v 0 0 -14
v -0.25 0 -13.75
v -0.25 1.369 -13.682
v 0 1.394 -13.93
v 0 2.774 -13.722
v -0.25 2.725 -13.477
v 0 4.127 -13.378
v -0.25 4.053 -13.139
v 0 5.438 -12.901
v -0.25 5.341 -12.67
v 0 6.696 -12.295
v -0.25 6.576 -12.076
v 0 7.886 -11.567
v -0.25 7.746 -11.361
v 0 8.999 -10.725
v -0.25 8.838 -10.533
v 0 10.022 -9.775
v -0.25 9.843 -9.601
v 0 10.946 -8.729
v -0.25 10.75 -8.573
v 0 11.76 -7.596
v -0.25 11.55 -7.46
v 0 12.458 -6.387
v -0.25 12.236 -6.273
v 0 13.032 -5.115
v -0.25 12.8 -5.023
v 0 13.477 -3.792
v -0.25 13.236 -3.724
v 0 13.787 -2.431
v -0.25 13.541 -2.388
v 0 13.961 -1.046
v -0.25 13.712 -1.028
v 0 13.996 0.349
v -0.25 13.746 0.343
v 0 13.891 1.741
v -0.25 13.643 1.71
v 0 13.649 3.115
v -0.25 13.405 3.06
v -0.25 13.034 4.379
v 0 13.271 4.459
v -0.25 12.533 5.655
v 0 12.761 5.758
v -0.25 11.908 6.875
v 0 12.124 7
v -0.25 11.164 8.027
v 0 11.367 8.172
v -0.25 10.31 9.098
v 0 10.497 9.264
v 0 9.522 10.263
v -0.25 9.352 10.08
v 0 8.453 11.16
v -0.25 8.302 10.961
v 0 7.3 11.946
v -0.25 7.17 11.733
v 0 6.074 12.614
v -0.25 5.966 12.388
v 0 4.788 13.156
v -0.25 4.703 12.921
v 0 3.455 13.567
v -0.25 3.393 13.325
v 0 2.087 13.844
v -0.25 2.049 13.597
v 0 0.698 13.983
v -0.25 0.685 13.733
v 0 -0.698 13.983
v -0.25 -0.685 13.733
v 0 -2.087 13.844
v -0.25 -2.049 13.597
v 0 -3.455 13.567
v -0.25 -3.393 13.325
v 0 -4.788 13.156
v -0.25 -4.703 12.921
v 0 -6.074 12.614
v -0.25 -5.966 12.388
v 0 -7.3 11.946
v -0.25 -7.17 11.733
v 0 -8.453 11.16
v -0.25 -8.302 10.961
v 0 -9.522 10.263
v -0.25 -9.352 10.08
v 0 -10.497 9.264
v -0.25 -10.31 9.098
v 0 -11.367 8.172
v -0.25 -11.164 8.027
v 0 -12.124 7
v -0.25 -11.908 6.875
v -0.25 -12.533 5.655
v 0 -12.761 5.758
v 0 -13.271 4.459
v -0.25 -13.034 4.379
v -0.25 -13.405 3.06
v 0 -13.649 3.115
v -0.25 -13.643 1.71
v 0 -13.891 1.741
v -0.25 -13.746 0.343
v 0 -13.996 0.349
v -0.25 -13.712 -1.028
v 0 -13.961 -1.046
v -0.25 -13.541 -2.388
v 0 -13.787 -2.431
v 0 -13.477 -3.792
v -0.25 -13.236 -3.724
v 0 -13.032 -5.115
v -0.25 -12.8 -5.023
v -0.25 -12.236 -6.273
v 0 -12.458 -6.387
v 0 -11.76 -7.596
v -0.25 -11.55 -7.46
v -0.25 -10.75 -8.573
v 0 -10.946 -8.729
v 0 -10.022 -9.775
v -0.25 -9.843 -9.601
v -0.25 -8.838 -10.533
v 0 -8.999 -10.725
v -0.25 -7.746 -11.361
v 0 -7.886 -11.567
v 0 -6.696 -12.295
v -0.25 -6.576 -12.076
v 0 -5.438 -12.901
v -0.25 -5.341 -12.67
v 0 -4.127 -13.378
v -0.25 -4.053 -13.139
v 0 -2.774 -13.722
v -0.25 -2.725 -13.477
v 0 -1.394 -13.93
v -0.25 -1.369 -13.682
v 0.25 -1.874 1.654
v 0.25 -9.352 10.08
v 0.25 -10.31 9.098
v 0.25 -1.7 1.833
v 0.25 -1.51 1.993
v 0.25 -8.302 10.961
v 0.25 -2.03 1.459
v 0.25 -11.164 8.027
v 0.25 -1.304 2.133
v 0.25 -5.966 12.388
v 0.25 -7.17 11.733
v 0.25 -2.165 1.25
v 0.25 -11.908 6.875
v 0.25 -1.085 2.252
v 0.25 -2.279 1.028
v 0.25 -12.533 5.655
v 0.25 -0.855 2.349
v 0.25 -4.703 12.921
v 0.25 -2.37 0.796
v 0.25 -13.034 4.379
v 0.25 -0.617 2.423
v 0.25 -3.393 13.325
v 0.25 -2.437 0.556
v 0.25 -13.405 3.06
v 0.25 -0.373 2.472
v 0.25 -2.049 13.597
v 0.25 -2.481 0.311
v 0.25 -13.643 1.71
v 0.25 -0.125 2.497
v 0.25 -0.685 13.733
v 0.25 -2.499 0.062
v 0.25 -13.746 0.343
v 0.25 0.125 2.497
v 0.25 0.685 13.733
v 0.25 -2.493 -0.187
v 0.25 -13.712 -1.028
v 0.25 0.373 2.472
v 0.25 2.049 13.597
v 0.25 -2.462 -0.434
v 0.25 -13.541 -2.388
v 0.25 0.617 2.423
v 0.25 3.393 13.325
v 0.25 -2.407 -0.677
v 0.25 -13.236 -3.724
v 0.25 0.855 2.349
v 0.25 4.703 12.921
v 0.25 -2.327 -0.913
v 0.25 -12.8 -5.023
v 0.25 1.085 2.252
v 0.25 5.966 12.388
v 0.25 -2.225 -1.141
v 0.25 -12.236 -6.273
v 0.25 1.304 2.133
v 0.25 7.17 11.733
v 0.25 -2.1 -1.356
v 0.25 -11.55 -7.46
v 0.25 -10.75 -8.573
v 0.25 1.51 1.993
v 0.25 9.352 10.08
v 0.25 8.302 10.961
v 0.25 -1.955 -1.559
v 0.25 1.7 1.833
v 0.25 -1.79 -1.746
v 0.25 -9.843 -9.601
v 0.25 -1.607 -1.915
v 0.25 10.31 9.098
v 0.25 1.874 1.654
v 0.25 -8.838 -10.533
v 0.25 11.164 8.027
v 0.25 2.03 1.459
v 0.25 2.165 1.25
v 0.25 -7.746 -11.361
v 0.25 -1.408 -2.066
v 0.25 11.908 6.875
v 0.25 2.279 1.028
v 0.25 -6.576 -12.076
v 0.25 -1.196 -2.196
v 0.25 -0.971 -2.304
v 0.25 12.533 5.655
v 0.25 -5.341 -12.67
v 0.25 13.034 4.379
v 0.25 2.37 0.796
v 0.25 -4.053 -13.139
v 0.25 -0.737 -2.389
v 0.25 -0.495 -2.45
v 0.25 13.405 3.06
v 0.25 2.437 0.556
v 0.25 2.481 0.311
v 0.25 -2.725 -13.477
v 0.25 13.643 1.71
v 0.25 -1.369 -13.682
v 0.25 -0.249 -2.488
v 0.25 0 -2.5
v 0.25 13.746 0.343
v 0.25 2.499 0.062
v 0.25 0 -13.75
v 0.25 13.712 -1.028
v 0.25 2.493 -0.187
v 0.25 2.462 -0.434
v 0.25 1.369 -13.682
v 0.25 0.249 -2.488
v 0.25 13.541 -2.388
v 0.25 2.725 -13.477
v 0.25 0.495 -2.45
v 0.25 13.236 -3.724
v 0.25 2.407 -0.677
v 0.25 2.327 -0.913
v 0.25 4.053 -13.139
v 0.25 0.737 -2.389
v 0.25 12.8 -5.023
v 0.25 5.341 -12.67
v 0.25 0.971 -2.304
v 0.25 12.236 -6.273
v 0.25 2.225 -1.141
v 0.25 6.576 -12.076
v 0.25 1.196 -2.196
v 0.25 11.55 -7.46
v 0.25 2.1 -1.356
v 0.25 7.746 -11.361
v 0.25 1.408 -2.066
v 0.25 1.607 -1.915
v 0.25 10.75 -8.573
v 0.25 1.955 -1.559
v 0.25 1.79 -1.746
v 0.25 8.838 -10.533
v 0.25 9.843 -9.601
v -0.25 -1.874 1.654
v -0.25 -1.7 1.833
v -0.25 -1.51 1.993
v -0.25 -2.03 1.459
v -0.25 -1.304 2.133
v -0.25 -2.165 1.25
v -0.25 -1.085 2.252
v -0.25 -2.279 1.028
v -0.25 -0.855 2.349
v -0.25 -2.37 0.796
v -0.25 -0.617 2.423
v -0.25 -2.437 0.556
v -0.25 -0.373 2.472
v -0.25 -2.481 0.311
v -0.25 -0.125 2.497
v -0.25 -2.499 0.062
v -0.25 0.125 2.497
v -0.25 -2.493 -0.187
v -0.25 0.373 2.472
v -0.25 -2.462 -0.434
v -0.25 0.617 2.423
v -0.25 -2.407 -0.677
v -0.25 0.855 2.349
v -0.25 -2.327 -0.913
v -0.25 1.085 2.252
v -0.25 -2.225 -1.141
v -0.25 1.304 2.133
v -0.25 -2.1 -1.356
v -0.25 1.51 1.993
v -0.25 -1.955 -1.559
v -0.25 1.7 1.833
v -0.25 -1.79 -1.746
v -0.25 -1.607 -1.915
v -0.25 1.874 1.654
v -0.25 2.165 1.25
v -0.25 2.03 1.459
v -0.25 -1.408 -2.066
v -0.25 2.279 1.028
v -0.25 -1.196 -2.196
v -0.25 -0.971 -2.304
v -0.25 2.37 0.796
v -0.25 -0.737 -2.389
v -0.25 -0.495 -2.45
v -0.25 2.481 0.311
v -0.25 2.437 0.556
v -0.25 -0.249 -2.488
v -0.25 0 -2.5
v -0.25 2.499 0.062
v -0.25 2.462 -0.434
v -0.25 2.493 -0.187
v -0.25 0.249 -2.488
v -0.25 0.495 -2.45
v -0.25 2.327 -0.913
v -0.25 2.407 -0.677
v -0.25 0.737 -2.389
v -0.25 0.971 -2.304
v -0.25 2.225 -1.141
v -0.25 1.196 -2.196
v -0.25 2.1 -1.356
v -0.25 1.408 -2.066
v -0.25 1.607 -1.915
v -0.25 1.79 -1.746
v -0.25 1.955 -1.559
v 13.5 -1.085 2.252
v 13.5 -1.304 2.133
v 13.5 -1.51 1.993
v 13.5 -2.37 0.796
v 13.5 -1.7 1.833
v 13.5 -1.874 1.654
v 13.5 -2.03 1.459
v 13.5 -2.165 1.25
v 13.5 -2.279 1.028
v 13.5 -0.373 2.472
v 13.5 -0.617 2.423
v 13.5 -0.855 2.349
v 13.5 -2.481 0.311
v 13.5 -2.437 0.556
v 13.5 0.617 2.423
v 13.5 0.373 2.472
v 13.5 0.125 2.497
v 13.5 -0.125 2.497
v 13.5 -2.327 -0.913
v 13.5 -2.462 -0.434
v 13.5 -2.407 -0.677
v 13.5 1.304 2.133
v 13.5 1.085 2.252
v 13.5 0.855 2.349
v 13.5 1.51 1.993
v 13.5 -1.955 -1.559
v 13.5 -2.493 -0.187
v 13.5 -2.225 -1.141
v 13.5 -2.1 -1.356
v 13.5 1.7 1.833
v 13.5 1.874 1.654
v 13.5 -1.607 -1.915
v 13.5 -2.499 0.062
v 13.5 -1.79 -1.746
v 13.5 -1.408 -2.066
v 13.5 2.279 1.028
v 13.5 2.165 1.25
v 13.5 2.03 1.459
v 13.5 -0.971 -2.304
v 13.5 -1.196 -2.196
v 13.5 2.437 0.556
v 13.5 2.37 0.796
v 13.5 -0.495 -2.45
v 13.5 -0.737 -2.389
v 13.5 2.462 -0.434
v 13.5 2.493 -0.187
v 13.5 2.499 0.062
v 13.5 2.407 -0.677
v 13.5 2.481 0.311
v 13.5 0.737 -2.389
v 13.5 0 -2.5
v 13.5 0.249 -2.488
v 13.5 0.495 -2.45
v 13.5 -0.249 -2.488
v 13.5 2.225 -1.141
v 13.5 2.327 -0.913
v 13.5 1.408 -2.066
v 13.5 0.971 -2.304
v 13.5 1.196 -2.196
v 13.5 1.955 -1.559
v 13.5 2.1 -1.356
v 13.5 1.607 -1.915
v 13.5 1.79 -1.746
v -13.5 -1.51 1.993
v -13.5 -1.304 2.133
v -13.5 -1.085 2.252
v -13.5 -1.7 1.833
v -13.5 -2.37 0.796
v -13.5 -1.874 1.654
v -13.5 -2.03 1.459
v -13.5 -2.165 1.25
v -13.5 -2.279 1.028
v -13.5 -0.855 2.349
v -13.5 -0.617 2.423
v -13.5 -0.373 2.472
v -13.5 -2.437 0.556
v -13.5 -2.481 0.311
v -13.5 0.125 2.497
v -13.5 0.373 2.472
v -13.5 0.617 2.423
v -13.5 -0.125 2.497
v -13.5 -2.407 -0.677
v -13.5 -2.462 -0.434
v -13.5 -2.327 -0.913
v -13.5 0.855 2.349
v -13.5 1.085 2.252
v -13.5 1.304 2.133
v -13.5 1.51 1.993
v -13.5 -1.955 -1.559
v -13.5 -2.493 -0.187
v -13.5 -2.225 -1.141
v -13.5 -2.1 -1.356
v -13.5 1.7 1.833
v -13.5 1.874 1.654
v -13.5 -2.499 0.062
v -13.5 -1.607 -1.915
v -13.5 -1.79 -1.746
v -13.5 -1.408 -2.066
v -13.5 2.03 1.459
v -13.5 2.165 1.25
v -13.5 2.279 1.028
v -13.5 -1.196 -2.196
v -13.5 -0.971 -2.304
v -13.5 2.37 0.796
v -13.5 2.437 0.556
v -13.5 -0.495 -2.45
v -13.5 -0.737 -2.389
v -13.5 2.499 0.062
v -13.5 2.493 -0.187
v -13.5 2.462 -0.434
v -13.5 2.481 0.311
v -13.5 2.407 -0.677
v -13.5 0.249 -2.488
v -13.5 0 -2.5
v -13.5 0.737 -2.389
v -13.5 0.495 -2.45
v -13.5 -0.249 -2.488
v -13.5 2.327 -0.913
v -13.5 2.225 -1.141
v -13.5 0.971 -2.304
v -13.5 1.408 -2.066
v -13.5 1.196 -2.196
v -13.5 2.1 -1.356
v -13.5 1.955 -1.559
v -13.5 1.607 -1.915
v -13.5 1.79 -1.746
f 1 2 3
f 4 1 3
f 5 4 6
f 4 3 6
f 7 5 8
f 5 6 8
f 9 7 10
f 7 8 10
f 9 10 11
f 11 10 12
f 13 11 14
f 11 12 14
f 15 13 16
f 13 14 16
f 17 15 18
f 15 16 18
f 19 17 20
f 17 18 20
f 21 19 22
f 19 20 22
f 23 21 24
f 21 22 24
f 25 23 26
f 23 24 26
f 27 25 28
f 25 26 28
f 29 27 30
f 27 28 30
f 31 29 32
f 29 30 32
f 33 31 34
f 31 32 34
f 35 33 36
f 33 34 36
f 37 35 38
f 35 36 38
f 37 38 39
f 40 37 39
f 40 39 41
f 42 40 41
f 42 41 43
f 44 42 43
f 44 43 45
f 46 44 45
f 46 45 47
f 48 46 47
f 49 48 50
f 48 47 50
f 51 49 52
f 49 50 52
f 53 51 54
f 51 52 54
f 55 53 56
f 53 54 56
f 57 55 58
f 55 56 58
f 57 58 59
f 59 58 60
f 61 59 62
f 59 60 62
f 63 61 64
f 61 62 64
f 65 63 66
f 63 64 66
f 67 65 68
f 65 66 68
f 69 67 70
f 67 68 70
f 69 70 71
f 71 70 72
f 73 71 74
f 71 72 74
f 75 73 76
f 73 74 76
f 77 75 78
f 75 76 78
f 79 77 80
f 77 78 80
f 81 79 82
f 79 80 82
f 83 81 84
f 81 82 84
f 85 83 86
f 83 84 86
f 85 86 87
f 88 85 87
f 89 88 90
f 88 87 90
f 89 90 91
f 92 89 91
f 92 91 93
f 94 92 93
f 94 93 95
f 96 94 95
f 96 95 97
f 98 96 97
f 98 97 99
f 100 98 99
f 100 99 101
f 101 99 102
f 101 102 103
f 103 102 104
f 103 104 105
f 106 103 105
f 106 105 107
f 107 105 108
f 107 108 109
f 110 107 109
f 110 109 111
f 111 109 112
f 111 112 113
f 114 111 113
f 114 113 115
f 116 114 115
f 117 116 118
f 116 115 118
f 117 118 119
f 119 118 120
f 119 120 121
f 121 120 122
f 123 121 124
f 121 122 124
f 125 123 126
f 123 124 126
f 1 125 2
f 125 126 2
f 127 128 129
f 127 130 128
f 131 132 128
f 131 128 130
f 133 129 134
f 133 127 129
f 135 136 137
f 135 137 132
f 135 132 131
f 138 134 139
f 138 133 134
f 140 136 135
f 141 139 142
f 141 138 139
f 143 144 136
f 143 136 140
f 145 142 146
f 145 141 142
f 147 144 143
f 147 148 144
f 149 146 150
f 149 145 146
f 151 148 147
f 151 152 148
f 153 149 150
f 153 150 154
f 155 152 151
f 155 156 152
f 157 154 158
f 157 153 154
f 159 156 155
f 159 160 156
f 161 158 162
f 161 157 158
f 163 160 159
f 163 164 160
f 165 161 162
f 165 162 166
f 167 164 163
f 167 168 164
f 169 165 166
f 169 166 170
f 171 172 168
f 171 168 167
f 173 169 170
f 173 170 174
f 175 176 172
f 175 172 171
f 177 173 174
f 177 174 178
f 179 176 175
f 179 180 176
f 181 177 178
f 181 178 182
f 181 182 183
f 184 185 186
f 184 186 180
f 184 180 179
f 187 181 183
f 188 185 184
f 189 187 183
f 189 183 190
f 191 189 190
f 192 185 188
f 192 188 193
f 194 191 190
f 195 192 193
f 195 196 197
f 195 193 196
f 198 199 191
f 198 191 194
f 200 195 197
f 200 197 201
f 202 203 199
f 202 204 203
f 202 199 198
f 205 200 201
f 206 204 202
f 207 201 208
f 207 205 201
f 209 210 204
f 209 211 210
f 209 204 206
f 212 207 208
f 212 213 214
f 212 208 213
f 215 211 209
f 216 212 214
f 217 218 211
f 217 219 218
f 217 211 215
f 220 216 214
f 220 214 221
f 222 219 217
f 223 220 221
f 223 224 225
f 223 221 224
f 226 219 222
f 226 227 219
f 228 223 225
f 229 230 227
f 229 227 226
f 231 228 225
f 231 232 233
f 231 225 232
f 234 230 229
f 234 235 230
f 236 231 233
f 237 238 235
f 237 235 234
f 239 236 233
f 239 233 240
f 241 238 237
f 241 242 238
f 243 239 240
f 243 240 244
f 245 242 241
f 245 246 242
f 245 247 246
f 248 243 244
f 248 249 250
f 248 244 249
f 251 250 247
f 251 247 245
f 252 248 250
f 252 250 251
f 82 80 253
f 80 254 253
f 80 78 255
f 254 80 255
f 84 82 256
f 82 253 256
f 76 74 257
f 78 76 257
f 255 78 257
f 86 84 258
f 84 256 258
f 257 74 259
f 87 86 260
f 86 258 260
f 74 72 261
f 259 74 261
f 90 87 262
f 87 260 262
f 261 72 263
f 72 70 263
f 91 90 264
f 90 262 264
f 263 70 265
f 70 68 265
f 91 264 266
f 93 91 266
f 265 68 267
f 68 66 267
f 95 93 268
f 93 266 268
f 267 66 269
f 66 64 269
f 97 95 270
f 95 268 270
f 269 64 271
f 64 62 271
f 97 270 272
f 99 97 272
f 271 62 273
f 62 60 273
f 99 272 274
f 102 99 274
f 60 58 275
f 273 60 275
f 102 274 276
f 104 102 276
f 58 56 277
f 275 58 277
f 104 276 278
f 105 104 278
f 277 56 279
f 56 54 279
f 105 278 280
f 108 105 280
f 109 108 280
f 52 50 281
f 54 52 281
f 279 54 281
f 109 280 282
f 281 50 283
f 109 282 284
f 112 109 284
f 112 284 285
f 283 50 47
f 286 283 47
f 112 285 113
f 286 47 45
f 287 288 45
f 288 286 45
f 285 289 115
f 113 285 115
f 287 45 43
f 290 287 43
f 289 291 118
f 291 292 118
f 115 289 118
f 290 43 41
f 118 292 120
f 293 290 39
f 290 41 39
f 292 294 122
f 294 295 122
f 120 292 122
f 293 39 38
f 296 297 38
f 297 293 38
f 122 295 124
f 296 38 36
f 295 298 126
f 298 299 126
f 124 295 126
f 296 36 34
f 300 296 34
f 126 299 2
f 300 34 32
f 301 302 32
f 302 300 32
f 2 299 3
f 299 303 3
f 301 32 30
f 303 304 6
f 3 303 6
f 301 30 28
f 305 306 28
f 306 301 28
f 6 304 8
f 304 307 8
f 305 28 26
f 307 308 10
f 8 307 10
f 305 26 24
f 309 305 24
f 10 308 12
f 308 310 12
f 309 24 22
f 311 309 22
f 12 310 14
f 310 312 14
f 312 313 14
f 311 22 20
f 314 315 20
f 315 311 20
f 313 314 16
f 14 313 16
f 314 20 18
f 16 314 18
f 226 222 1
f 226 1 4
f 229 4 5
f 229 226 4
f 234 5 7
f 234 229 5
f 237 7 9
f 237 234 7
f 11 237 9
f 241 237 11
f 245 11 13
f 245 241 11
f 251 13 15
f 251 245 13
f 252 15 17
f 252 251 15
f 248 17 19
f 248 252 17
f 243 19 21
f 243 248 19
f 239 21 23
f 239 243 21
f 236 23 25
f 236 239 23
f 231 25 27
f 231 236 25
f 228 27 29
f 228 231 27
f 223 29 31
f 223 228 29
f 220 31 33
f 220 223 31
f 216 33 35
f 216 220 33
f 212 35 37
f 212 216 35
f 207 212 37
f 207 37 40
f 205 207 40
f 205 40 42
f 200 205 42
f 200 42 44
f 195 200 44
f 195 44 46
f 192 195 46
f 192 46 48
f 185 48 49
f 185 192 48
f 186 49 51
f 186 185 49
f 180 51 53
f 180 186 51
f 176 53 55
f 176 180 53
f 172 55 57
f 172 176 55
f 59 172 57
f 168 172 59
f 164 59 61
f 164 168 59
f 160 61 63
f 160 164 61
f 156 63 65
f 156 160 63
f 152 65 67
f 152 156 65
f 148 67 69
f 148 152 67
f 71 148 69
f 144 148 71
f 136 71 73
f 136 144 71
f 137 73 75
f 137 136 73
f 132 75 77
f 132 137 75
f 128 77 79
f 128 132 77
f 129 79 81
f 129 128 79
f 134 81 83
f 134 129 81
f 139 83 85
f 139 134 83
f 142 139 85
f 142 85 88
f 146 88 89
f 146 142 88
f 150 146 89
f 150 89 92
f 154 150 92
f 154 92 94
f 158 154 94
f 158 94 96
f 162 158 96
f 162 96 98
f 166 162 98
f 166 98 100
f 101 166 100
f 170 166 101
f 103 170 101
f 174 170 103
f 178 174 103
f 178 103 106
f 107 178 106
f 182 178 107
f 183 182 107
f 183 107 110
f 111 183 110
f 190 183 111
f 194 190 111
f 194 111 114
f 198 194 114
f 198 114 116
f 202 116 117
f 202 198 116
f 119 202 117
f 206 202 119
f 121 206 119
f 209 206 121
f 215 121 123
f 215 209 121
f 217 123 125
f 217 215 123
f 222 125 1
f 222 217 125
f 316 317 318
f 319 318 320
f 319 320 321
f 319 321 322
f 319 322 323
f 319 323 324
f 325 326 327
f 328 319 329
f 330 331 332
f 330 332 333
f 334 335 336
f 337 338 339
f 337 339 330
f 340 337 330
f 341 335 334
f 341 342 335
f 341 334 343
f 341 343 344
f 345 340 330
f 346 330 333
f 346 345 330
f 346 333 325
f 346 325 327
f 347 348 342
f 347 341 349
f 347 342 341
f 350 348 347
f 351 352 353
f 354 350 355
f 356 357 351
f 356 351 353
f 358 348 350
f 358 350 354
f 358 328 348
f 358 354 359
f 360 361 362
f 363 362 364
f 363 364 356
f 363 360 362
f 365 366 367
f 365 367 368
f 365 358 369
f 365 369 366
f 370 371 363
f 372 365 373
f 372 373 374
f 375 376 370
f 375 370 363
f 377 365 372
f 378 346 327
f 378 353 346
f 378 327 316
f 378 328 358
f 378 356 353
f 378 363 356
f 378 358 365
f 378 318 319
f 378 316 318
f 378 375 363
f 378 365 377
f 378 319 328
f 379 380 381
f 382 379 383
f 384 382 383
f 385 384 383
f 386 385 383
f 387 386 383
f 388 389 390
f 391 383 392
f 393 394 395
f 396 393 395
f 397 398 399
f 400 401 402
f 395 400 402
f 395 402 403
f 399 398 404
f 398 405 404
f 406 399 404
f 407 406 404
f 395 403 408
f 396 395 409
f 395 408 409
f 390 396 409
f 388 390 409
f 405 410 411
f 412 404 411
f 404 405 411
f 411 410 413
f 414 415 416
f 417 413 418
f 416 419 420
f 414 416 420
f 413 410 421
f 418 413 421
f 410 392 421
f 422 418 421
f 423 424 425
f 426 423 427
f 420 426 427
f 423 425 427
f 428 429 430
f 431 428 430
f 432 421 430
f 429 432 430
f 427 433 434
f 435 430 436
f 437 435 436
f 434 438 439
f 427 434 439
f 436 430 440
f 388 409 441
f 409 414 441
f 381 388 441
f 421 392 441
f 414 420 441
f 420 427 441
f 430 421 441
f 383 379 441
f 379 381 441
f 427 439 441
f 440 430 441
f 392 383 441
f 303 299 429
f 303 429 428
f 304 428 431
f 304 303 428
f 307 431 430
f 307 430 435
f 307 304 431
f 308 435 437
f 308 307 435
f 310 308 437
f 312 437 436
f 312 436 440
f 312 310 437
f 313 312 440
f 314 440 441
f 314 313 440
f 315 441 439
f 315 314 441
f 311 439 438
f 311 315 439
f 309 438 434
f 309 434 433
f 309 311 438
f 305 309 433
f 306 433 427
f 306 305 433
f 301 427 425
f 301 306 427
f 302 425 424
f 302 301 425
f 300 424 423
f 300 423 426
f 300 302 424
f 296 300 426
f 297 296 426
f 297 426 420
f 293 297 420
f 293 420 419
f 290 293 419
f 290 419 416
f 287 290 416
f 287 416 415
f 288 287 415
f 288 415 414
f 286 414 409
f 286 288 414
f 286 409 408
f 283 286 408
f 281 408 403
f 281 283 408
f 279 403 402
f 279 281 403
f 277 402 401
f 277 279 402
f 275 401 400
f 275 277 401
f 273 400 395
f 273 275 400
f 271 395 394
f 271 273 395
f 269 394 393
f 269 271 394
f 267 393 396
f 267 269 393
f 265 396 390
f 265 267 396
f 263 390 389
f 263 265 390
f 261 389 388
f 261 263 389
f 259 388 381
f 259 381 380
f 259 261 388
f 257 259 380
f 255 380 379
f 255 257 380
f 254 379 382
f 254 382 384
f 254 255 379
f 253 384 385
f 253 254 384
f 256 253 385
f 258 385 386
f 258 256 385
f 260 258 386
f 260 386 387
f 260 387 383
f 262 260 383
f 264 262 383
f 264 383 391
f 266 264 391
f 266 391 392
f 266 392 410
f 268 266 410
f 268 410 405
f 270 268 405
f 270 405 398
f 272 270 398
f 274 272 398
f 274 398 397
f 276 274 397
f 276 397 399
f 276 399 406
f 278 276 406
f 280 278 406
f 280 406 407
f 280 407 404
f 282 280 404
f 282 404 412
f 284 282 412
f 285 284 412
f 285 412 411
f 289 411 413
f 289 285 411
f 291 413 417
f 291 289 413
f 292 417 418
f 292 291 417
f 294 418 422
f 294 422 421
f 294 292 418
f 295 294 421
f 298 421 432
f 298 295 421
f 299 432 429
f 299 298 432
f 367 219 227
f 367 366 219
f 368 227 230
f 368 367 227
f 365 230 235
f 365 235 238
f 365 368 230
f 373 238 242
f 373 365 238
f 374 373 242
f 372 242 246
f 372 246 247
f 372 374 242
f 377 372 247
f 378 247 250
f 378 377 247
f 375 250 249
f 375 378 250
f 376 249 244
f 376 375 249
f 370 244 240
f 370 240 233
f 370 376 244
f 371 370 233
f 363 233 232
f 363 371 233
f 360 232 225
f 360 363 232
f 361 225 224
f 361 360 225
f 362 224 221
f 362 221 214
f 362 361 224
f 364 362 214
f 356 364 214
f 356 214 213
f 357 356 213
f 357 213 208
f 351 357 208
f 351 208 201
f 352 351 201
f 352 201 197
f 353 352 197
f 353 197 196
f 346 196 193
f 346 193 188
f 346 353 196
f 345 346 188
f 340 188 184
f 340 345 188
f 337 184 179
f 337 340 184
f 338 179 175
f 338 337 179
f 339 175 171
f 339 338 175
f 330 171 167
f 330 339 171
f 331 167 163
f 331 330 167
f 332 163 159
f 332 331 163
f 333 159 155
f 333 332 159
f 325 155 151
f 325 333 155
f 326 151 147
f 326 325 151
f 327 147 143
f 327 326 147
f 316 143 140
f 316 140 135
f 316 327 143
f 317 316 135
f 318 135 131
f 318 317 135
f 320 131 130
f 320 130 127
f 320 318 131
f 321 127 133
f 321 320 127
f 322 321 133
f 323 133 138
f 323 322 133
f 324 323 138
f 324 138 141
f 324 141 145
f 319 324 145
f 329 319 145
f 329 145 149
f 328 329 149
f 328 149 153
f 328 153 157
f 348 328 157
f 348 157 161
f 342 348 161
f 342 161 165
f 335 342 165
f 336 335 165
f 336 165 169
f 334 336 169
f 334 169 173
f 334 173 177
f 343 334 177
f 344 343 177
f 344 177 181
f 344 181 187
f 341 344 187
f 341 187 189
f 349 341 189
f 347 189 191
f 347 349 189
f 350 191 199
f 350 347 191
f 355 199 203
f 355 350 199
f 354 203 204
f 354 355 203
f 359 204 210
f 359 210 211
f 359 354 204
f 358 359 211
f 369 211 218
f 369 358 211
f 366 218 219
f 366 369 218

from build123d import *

# Parameters (mm, degrees)
SKETCH1_R           = 2.5
BOSS_EXTRUDE3_DEPTH = 13.5
SKETCH2_R           = 14
BOSS_EXTRUDE4_DEPTH = 0.25
CHAMFER1_SIZE       = 0.25


with BuildPart() as part:
    # Sketch1 → Boss-Extrude3 (new, symmetric)
    with BuildSketch(Plane(origin=(0, 0, 0), x_dir=(0, 0, -1), z_dir=(1, 0, 0))):
        Circle(SKETCH1_R)
    extrude(amount=BOSS_EXTRUDE3_DEPTH, both=True)

    # Sketch2 → Boss-Extrude4 (add, symmetric)
    with BuildSketch(Plane(origin=(0, 0, 0), x_dir=(0, 0, -1), z_dir=(1, 0, 0))):
        Circle(SKETCH2_R)
    extrude(amount=BOSS_EXTRUDE4_DEPTH, both=True)

    # Chamfer1
    chamfer1_edges = [part.edges().sort_by_distance(p)[0] for p in [
        (-0.25, 0, 14),
        (0.25, 0, 14),
    ]]
    chamfer(chamfer1_edges, length=CHAMFER1_SIZE - 0.0001)  # a hair under: the kernel refuses the full size


solid = part.part
